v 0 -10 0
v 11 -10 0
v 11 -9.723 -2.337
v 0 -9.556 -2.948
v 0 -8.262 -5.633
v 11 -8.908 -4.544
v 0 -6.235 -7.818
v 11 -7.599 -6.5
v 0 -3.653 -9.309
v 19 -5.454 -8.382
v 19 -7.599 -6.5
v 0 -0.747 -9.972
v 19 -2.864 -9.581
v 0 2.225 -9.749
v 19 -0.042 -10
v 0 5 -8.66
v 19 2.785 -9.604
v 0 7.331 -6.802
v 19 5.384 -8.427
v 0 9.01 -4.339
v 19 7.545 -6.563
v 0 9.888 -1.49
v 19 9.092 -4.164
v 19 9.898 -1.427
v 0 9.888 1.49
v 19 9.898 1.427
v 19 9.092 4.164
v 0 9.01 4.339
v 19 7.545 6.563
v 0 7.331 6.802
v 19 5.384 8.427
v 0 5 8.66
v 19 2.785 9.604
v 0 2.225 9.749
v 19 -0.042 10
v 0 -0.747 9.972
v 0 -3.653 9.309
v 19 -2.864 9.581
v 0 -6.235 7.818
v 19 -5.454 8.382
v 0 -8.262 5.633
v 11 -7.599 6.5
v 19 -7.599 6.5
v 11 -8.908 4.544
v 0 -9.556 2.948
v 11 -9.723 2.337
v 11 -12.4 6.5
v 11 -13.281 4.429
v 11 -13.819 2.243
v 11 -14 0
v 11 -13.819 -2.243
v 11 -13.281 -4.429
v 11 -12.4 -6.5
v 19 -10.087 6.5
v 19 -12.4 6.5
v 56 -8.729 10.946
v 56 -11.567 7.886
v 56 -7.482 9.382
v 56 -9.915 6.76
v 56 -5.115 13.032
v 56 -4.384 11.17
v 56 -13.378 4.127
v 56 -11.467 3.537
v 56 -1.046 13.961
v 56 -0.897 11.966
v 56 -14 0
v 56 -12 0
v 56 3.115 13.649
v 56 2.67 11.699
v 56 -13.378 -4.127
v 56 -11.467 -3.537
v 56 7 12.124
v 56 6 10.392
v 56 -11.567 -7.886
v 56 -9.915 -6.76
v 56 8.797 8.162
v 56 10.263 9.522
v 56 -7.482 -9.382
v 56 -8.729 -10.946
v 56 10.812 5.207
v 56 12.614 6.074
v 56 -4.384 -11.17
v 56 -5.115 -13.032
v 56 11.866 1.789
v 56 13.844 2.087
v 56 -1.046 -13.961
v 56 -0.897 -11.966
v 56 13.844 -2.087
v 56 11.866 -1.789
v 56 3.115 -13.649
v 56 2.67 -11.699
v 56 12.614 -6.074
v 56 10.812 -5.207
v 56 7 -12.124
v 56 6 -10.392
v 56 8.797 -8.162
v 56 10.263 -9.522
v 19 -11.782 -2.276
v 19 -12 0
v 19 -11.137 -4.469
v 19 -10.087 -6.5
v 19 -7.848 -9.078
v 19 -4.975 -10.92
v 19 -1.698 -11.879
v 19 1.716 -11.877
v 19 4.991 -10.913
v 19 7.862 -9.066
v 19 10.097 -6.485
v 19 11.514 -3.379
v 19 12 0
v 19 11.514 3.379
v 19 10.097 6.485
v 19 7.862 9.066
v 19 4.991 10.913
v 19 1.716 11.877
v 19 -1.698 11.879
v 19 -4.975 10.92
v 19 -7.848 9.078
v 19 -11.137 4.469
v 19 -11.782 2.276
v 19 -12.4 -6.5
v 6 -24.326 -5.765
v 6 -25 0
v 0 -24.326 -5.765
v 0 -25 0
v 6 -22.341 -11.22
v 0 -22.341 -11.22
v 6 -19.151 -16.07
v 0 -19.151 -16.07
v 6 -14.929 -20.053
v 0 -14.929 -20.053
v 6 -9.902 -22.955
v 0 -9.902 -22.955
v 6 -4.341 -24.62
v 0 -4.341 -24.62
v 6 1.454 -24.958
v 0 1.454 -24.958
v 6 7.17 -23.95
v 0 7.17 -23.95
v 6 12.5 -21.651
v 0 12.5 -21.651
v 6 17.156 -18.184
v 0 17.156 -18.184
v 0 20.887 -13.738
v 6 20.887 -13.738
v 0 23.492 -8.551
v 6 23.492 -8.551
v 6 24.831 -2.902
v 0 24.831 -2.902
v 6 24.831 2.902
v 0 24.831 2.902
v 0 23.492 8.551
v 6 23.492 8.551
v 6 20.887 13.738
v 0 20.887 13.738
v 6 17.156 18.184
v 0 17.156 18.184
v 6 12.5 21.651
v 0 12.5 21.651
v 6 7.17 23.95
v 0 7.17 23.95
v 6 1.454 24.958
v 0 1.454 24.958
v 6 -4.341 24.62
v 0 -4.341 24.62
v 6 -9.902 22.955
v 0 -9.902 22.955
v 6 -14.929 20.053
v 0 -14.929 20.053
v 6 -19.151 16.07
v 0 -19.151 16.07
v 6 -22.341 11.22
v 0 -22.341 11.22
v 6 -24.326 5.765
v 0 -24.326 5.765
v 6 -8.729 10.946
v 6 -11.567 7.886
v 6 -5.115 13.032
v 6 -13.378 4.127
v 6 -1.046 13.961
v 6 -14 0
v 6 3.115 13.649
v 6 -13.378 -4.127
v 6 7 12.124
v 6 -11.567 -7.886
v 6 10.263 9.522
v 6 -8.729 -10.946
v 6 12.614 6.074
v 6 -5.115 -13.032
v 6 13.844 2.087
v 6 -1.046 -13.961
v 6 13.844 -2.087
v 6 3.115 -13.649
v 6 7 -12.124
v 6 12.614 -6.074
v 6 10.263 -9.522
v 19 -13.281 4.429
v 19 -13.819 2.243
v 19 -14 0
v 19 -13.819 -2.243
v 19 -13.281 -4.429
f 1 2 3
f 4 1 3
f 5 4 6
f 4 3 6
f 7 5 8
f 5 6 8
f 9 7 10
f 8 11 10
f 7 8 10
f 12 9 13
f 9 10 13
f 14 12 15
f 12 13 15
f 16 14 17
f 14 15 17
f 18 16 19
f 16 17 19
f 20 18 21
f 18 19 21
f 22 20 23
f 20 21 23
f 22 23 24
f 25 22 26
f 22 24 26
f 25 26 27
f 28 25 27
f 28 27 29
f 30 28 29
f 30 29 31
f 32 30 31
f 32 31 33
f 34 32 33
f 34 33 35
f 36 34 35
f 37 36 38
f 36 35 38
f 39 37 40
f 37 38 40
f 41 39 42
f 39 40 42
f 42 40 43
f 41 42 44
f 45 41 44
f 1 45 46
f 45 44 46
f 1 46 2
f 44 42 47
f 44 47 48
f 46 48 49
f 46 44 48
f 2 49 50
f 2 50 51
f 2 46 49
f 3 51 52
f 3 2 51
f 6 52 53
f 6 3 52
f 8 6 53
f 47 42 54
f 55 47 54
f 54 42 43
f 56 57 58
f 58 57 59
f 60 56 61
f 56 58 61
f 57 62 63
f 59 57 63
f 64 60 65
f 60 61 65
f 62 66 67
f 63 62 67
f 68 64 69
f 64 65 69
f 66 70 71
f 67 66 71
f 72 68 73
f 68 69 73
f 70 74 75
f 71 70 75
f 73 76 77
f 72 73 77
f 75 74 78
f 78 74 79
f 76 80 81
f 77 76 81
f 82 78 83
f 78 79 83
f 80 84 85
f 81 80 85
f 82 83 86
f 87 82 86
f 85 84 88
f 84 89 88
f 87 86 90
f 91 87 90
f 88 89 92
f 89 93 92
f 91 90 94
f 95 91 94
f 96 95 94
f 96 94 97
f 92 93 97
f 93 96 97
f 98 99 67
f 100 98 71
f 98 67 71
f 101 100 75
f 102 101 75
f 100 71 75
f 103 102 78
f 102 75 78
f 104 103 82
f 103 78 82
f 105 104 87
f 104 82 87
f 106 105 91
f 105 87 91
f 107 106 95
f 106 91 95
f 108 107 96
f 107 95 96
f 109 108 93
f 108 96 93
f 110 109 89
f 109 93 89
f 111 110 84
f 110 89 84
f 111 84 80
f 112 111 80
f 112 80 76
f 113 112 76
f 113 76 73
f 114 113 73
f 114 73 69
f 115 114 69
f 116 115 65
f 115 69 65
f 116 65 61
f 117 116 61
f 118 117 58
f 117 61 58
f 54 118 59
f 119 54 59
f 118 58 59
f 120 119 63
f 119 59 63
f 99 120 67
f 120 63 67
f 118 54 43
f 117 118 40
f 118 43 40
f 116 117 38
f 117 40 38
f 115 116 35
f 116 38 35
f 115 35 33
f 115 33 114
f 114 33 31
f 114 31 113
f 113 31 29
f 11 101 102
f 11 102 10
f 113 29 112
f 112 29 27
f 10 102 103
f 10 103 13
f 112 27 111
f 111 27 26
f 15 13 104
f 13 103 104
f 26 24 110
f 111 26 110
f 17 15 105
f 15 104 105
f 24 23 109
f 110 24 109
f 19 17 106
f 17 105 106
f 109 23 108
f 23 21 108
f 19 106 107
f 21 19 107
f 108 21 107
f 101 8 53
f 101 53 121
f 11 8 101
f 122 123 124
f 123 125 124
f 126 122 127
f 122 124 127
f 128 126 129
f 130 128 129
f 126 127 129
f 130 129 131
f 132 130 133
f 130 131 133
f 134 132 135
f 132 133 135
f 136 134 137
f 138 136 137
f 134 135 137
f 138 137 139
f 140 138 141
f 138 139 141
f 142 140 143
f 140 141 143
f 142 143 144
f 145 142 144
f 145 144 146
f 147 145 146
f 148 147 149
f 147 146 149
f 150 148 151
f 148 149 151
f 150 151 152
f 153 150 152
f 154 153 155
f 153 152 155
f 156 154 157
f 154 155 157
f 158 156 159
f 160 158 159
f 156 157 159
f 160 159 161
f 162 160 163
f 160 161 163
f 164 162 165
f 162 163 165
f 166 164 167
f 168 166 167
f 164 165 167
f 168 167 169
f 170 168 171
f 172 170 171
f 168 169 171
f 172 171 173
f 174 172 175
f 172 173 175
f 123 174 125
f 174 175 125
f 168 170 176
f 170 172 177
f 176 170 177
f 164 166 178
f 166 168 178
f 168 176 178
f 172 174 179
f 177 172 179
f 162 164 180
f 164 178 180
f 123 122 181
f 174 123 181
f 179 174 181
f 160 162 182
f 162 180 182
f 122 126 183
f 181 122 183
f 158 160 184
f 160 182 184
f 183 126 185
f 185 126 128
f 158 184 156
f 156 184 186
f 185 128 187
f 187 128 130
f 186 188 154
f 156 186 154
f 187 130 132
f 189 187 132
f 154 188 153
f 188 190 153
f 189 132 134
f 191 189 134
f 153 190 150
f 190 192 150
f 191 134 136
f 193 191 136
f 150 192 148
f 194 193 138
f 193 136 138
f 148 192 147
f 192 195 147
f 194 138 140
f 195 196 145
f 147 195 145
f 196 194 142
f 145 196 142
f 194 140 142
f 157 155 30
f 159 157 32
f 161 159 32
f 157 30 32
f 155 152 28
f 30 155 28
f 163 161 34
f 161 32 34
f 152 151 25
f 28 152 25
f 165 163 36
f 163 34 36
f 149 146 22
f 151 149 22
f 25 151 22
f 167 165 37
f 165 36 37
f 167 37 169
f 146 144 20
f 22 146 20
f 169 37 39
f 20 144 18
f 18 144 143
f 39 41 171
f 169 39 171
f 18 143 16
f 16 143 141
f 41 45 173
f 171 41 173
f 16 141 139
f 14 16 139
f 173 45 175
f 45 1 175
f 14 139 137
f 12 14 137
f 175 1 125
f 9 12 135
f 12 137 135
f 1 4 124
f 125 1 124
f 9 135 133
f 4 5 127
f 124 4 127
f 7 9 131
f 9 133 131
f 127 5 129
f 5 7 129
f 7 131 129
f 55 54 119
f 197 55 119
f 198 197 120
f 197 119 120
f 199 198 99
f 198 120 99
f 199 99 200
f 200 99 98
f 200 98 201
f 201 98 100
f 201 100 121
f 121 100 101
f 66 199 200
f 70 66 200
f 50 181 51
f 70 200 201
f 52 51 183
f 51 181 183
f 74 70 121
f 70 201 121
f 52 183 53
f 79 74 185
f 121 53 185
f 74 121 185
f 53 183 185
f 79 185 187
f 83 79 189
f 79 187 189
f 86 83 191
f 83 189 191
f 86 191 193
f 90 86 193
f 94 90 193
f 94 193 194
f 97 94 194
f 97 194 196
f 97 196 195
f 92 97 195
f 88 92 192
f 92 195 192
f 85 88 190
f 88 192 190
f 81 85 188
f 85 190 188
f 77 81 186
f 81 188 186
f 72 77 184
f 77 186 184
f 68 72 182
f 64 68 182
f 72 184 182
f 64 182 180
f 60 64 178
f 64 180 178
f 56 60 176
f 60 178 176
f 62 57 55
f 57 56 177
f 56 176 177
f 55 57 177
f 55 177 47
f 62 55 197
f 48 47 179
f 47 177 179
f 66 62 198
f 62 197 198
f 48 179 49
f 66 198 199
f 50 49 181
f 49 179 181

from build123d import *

# Parameters (mm, degrees)
CUT_EXTRUDE1_REACH = 68.227
SKETCH4_W          = 8
SKETCH4_H          = 13


with BuildPart() as part:
    # Sketch1 → Revolve1 (revolve)
    with BuildSketch(Plane.XY, mode=Mode.PRIVATE) as revolve1_sk:
        Polygon((0, 25), (0, 10), (19, 10), (19, 12), (56, 12), (56, 14), (6, 14), (6, 25), align=None)
    revolve(revolve1_sk.sketch.rotate(Axis((-64.900117457, 0, 0), (1, 0, 0)), 180), axis=Axis((-64.900117457, 0, 0), (1, 0, 0)))

    # Sketch4 → Cut-Extrude1 (cut, up to next)
    with BuildSketch(Plane(origin=(0, 0, 0), x_dir=(1, 0, 0), z_dir=(0, 1, 0)), mode=Mode.PRIVATE) as cut_extrude1_sk1:
        with Locations((15, 0)):
            Rectangle(SKETCH4_W, SKETCH4_H)
    cut_extrude1_tool1 = extrude(cut_extrude1_sk1.sketch, amount=-CUT_EXTRUDE1_REACH, mode=Mode.PRIVATE) & part.part
    add(cut_extrude1_tool1.solids().sort_by_distance((15, 0, 0))[0], mode=Mode.SUBTRACT)


solid = part.part
